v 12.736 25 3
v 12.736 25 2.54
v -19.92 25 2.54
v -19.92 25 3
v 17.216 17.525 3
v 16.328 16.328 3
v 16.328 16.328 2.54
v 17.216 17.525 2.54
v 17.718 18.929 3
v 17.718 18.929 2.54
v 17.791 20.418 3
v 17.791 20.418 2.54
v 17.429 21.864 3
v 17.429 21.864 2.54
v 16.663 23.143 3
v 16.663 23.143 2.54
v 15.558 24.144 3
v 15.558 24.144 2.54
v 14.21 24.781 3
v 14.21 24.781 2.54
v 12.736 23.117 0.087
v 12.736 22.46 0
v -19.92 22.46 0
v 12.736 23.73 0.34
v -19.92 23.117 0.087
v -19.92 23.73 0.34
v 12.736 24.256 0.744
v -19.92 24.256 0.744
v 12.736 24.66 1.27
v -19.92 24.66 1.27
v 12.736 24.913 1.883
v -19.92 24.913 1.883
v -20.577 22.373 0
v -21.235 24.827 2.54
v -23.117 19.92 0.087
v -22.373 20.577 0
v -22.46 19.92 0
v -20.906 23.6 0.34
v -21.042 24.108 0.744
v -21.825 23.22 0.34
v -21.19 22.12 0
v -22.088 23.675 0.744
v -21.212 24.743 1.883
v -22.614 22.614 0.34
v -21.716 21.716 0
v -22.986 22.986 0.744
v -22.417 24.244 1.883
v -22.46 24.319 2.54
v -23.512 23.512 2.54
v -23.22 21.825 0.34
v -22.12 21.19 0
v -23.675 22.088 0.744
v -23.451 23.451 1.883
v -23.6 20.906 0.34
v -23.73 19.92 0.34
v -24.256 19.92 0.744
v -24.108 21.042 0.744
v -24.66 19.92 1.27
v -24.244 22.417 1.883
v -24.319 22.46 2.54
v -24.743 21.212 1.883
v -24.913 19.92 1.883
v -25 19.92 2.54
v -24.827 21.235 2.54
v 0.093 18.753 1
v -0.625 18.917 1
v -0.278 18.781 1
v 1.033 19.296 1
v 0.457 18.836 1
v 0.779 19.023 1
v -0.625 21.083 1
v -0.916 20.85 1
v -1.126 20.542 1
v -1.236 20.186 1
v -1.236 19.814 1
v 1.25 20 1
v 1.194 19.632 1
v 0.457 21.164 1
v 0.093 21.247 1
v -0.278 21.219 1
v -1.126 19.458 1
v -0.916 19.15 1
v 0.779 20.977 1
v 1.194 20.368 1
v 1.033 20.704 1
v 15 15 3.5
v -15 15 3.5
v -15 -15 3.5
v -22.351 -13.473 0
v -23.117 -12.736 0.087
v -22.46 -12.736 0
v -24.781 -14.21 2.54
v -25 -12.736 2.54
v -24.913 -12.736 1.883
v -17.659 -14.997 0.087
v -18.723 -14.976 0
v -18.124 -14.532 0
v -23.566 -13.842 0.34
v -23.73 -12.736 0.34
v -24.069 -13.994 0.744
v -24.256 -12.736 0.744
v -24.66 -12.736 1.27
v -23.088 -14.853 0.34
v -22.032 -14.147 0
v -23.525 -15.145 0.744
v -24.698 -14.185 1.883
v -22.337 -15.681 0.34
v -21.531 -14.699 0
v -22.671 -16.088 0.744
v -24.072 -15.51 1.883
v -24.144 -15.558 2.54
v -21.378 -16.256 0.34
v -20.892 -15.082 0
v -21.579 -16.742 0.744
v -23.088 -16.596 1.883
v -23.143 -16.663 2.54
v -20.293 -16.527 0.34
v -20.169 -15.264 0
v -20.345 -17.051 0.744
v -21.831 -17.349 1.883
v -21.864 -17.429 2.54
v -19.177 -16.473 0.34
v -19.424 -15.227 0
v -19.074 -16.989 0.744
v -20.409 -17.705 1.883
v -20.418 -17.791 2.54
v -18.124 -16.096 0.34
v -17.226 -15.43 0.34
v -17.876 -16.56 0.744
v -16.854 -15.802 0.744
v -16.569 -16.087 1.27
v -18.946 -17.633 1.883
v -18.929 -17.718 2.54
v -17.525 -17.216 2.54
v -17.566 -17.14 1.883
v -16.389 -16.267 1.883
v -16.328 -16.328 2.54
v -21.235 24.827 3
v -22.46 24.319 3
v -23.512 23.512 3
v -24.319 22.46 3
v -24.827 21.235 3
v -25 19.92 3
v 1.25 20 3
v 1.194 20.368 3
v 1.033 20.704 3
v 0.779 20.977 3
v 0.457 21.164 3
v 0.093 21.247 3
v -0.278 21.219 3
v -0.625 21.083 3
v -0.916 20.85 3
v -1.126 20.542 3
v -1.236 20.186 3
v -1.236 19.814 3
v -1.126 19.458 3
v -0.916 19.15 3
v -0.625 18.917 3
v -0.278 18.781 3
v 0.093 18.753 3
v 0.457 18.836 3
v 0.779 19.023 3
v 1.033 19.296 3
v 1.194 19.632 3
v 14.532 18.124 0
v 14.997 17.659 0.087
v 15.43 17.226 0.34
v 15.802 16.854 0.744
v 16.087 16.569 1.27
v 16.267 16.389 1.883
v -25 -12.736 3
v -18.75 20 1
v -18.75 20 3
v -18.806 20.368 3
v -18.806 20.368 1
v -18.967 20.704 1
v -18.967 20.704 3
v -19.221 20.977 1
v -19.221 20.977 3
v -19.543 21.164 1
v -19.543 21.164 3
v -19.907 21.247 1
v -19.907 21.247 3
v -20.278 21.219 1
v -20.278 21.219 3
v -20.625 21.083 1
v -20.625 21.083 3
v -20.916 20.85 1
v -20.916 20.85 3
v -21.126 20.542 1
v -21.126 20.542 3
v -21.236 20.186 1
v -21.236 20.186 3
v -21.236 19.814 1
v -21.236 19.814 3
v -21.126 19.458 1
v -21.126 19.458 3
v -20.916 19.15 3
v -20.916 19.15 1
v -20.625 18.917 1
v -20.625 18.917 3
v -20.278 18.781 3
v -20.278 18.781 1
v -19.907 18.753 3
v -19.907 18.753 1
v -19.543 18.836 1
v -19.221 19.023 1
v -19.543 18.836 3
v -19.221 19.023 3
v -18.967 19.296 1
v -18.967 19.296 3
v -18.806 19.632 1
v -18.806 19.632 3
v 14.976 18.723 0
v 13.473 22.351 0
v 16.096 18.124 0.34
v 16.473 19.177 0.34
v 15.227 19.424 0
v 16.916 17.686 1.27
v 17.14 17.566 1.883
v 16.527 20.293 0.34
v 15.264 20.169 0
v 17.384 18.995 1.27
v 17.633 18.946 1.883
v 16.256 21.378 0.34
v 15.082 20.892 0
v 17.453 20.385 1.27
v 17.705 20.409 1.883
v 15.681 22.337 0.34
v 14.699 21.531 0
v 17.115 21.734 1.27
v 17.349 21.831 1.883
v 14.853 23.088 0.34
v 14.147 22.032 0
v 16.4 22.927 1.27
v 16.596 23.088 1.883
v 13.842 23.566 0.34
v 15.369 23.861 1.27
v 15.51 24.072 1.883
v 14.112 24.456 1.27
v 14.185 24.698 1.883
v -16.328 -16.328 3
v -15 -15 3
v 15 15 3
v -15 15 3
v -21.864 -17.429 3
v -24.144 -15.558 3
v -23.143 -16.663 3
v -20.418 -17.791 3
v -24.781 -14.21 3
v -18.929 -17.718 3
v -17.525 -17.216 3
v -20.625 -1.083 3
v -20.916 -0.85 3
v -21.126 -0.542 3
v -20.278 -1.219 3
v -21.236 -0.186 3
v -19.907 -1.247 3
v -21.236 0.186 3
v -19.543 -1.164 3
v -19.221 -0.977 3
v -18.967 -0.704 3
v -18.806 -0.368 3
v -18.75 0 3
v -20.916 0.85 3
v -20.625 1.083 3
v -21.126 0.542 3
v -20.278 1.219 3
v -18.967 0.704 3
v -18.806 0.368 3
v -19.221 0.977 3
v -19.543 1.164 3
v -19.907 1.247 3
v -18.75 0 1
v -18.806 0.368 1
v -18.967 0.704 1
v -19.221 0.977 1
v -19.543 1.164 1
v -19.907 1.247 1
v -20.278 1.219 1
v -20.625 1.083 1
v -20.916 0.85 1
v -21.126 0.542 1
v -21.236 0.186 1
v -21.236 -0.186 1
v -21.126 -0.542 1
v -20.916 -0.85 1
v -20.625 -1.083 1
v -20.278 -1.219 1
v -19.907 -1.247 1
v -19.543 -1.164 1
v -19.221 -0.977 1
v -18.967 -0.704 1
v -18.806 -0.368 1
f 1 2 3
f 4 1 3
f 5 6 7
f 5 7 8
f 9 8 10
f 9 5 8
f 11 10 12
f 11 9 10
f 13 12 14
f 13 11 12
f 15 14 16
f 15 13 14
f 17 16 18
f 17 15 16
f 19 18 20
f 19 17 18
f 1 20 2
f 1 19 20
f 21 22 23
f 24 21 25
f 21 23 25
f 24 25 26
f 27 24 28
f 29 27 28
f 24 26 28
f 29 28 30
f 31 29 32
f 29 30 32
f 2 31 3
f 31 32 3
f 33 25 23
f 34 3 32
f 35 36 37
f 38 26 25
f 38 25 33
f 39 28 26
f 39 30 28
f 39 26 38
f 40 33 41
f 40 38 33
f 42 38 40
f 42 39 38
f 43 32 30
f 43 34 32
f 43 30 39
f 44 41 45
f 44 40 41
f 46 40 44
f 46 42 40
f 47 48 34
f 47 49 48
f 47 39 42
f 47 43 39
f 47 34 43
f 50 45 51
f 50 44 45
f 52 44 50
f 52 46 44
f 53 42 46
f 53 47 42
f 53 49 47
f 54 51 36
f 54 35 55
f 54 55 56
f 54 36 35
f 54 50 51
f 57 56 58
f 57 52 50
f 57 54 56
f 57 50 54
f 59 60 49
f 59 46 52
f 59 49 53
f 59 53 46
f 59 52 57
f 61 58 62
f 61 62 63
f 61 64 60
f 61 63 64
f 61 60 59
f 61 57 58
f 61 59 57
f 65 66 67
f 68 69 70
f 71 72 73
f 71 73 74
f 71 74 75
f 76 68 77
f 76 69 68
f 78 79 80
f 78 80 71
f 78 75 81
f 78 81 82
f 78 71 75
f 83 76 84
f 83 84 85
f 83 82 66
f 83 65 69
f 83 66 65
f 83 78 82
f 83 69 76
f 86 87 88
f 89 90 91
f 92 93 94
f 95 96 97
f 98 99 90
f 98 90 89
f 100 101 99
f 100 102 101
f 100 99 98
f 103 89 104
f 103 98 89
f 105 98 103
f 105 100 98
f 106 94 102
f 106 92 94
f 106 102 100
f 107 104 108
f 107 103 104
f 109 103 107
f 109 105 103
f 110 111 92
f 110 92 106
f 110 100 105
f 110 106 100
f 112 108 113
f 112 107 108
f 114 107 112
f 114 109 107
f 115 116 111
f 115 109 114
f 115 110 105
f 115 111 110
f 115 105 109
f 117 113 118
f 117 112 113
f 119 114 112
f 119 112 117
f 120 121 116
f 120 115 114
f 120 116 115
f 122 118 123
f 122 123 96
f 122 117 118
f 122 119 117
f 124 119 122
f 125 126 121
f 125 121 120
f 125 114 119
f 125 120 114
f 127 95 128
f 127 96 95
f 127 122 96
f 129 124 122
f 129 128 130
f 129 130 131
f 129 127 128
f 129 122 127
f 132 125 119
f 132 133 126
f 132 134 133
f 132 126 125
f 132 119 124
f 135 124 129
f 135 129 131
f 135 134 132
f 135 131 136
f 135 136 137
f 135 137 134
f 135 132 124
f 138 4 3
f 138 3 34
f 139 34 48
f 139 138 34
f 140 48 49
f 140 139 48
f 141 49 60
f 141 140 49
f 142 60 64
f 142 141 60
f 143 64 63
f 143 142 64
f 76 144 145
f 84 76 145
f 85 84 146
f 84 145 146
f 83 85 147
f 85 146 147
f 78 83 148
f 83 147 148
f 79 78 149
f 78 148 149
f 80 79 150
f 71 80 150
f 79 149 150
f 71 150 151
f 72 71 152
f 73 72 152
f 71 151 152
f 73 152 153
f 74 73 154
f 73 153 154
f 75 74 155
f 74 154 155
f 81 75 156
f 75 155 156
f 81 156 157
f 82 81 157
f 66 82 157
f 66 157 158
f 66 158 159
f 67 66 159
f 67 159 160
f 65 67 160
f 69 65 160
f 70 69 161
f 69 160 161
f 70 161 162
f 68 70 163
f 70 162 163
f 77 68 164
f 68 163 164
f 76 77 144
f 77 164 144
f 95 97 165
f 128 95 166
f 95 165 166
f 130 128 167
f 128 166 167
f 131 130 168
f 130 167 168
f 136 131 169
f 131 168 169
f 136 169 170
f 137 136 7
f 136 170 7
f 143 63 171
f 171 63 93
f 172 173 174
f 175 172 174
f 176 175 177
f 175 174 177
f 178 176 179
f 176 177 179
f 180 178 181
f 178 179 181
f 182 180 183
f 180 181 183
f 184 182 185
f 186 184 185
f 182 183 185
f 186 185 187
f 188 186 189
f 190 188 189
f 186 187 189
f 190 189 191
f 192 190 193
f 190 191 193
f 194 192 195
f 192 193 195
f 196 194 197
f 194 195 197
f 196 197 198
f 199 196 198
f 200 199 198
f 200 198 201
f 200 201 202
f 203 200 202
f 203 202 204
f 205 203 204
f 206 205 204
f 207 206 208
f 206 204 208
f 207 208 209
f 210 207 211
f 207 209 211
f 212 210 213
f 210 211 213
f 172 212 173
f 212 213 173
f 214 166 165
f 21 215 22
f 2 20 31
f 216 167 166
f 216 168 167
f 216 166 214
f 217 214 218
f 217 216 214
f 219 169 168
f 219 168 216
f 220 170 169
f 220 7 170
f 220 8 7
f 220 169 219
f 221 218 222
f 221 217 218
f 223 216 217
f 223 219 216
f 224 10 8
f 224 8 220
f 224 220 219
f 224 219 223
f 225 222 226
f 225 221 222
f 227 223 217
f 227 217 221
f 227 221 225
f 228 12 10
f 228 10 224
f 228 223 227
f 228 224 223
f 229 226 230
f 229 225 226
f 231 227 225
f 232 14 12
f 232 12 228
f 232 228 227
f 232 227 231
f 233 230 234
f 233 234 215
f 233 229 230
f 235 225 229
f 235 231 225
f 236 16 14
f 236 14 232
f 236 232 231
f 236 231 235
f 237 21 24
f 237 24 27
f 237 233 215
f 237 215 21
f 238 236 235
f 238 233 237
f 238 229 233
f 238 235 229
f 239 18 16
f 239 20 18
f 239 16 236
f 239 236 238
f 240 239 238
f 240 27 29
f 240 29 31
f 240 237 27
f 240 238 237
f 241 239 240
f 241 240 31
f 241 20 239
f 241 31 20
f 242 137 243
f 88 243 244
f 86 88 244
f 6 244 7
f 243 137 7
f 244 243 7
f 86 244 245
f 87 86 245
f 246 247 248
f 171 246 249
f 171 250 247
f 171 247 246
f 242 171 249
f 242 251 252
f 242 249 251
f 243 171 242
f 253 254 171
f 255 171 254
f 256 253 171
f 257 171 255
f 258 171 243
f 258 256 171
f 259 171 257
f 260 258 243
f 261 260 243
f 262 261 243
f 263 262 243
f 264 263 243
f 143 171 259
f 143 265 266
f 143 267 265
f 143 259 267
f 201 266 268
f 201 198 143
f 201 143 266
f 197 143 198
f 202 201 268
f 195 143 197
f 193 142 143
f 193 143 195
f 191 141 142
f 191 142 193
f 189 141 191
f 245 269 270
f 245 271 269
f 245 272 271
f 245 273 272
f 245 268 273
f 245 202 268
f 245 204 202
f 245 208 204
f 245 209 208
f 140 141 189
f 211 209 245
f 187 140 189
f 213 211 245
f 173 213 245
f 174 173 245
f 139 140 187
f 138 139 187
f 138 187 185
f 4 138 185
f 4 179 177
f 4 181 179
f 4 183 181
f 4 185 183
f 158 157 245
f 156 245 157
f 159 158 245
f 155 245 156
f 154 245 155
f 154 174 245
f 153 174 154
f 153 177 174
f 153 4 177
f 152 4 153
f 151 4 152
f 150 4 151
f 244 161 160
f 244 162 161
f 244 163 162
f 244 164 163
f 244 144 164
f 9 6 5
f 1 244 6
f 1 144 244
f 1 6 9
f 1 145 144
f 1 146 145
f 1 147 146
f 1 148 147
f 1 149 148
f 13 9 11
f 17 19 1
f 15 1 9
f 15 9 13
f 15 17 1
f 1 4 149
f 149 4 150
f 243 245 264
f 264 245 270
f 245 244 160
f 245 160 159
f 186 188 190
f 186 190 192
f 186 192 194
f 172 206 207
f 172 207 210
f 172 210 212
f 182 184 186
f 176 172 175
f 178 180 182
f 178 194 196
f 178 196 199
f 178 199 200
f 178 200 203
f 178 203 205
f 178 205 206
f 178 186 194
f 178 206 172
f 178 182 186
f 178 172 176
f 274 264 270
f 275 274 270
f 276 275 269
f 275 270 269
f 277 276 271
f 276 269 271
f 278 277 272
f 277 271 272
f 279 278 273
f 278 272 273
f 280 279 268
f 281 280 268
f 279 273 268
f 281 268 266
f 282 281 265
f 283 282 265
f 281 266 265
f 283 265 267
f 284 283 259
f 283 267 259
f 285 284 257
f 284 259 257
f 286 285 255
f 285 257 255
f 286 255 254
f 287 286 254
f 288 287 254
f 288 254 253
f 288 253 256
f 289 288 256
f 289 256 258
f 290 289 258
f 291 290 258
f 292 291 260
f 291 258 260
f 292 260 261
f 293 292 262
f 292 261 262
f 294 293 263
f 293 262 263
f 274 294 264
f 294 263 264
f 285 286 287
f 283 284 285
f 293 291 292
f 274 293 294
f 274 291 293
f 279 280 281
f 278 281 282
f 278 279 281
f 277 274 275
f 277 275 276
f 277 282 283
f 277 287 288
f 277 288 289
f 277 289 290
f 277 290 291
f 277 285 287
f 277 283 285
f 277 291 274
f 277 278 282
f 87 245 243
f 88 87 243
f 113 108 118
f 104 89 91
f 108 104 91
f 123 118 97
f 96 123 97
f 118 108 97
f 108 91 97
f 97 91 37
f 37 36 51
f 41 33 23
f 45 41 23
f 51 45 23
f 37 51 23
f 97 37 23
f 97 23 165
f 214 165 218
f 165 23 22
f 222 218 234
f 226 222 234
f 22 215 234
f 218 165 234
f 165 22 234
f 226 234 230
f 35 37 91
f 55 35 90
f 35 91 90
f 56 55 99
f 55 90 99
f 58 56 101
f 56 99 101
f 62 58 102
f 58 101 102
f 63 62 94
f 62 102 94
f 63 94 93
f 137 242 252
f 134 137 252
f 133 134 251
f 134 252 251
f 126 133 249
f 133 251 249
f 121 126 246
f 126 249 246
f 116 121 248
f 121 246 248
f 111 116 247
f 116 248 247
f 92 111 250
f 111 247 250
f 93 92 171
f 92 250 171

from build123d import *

# Parameters (mm, degrees)
F1_DEPTH = 3
F2_DEPTH = 3.5
F3_R     = 1.25
F4_DEPTH = 2
F5_R     = 5.08
F6_R     = 2.54


with BuildPart() as f1:
    # F0 (on Top) → F1 (new body)
    with BuildSketch(Plane.XY):
        Polygon((15, 15), (25, 25), (-25, 25), (-25, -25), (-15, -15), (-15, 15), align=None)
    extrude(amount=F1_DEPTH)

    # F0 (on Top) → F2 (join)
    with BuildSketch(Plane.XY):
        Polygon((-15, -15), (15, 15), (-15, 15), align=None)
    extrude(amount=F2_DEPTH)

    # F3 (on face) → F4 (cut)
    with BuildSketch(Plane.XY.offset(3)):
        with Locations((-20, 20)):
            Circle(F3_R)
        with Locations((0, 20)):
            Circle(F3_R)
        with Locations((-20, 0)):
            Circle(F3_R)
    extrude(amount=-F4_DEPTH, mode=Mode.SUBTRACT)

    # F5
    f5_edges = [f1.edges().sort_by_distance(p)[0] for p in [
        (-25, 25, 1.5),
        (25, 25, 1.5),
        (-25, -25, 1.5),
    ]]
    fillet(f5_edges, radius=F5_R)

    # F6
    f6_edges = [f1.edges().sort_by_distance(p)[0] for p in [
        (-3.592102, 25, 0),
        (17.429103, 21.864032, 0),
        (-23.512102, 23.512102, 0),
        (0, 0, 0),
        (-25, 3.592102, 0),
        (-21.864032, -17.429103, 0),
    ]]
    fillet(f6_edges, radius=F6_R)


solid = f1.part
